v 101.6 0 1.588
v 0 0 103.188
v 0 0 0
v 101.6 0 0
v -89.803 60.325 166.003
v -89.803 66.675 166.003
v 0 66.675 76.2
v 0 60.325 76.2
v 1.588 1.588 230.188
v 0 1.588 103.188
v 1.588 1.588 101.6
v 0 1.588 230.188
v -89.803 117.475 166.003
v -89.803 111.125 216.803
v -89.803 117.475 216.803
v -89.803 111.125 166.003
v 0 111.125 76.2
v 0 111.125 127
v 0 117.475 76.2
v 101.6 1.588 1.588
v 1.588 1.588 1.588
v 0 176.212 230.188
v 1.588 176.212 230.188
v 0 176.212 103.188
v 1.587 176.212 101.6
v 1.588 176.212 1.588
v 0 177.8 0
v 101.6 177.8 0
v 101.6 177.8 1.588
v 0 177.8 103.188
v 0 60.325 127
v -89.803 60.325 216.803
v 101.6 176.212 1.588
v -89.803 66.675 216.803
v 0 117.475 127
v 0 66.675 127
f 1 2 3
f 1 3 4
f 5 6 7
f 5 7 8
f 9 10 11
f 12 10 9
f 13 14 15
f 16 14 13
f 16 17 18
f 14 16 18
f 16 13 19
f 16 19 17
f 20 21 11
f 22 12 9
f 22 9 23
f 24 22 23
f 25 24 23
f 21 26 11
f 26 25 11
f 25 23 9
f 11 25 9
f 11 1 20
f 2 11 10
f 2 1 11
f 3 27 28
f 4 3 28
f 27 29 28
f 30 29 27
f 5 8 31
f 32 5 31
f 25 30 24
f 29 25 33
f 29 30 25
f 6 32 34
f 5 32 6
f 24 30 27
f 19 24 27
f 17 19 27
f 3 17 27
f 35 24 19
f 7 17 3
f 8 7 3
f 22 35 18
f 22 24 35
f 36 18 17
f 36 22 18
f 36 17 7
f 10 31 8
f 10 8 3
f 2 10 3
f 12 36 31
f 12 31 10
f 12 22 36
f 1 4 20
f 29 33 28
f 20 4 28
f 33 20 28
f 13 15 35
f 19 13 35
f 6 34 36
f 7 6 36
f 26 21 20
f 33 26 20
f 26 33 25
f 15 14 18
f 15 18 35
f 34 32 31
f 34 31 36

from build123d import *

# Parameters (mm, degrees)
F0_W     = 101.6
F0_H     = 177.8
F1_DEPTH = 1.5875
F3_DEPTH = 1.5875
F5_DEPTH = 1.5875
F7_DEPTH = 1.5875
F8_W     = 6.35
F8_H     = 50.8


with BuildPart() as f1:
    # F0 (on Top) → F1 (new body)
    with BuildSketch(Plane.XY):
        with Locations((50.8, 88.9)):
            Rectangle(F0_W, F0_H)
    extrude(amount=F1_DEPTH)

    # F2 (on Front) → F3 (join)
    with BuildSketch(Plane.XZ):
        Polygon((0, 103.1875), (0, 1.5875), (101.6, 1.5875), align=None)
    extrude(amount=-F3_DEPTH)

    # F4 (on face) → F5 (join)
    with BuildSketch(Plane(origin=(0, 177.8, 0), x_dir=(-1, 0, 0), z_dir=(0, 1, 0))):
        Polygon((-101.6, 1.5875), (0, 1.5875), (0, 103.1875), align=None)
    extrude(amount=-F5_DEPTH)

    # F6 (on face) → F7 (join)
    with BuildSketch(Plane(origin=(0, 0, 0), x_dir=(0, -1, 0), z_dir=(-1, 0, 0))):
        Polygon((-176.2125, 1.5875), (-1.5875, 1.5875), (-1.5875, 103.1875), (-1.5875, 230.1875), (-176.2125, 230.1875), (-176.2125, 103.1875), align=None)
    extrude(amount=-F7_DEPTH)

    # F11: sweep along a path in F10
    with BuildLine(Plane(origin=(0, 66.675, 0), x_dir=(-1, 0, 0), z_dir=(0, 1, 0))) as f11_path:
        Line((0, 76.2), (89.8025612107, 166.0025612107))
    # F8 (on face) → F11 (sweep)
    with BuildSketch(Plane(origin=(0, 0, 0), x_dir=(0, -1, 0), z_dir=(-1, 0, 0))):
        with Locations((-63.5, 101.6)):
            Rectangle(F8_W, F8_H)
        with Locations((-114.3, 101.6)):
            Rectangle(F8_W, F8_H)
    sweep(path=f11_path.line)


solid = f1.part
